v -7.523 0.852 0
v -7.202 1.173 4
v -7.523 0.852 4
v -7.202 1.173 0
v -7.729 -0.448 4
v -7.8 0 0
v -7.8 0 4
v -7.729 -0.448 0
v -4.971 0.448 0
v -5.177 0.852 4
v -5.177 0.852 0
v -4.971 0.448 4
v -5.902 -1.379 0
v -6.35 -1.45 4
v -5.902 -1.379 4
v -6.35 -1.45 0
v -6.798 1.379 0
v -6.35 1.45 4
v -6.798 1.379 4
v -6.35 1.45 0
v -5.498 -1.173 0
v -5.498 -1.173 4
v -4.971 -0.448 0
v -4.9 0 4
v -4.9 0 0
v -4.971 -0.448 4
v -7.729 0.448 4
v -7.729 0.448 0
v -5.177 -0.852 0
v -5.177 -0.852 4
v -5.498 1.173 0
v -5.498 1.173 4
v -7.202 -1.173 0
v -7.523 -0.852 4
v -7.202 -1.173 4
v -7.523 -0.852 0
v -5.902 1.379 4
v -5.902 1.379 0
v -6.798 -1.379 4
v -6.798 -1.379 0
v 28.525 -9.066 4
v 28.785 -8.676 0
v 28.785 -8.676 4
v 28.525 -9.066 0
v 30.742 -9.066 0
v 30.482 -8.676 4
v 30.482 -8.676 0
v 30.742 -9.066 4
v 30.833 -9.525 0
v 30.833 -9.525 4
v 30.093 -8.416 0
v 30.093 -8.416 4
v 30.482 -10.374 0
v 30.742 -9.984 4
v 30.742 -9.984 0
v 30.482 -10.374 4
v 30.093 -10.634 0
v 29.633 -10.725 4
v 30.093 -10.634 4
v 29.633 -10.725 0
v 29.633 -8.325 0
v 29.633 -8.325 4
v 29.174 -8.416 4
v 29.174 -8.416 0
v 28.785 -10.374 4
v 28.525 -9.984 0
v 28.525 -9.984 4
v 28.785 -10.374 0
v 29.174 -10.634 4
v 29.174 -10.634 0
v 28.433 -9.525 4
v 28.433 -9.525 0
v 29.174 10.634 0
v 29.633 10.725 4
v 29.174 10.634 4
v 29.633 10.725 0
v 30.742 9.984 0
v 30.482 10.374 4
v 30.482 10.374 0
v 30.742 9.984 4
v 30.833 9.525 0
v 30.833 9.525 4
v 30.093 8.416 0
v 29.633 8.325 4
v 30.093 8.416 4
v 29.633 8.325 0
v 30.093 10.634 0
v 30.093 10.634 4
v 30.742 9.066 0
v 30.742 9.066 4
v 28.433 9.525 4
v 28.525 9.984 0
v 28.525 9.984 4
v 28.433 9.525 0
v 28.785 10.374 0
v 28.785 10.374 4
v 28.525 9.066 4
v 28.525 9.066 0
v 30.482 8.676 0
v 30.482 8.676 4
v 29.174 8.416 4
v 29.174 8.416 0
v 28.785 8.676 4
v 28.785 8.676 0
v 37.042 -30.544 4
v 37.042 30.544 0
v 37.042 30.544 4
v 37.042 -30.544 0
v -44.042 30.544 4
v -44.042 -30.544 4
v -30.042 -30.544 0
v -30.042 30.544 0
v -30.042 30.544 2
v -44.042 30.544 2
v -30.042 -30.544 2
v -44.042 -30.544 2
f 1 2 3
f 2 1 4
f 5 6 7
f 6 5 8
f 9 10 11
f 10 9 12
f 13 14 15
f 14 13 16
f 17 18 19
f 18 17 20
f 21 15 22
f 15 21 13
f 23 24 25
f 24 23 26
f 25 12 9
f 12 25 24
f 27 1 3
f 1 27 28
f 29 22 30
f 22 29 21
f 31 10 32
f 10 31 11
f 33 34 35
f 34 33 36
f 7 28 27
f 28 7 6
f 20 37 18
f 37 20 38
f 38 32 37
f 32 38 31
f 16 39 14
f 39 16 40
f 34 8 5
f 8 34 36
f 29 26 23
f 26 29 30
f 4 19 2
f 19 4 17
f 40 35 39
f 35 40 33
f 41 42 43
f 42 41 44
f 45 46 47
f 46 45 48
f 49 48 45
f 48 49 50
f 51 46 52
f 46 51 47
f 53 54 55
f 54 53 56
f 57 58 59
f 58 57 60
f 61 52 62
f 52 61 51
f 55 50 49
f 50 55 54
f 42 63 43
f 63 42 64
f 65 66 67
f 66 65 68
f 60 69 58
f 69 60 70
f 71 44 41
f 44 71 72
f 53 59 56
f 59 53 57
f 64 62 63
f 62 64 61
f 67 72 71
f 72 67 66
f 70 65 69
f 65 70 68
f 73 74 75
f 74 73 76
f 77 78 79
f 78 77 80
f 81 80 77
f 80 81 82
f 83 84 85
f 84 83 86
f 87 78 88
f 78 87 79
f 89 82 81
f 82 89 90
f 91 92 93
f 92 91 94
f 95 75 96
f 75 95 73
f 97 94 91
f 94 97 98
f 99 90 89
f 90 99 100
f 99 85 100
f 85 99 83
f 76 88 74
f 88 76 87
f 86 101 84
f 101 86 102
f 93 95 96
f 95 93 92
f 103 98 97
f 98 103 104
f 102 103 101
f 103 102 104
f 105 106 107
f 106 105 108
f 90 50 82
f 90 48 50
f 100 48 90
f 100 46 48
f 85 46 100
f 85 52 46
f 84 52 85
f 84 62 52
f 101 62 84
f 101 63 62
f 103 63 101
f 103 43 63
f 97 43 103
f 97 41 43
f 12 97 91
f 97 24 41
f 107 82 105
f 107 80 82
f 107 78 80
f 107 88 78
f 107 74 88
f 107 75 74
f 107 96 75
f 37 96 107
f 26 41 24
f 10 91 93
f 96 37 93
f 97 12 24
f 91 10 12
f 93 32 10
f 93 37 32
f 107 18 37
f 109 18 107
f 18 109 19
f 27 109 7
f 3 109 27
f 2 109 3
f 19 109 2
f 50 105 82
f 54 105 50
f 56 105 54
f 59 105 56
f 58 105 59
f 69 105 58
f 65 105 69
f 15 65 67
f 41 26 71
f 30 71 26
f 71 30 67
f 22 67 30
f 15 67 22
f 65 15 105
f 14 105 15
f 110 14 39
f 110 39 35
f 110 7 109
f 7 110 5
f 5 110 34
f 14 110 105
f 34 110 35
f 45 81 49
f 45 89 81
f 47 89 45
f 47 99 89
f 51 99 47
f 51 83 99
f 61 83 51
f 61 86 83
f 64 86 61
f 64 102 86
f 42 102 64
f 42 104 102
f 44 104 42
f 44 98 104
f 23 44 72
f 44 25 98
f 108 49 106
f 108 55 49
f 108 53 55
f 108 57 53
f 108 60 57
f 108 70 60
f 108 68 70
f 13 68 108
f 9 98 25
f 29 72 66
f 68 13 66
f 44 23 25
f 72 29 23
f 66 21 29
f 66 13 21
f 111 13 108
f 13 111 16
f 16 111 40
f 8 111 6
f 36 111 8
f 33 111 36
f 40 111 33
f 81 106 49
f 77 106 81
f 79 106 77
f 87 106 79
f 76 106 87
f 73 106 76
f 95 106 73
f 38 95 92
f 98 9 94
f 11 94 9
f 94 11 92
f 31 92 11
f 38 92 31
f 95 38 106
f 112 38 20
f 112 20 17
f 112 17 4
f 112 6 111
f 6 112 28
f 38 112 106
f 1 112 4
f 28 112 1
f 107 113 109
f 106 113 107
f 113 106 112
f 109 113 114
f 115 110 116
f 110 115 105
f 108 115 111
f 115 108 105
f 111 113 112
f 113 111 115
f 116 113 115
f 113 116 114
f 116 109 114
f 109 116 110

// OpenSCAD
// file: ../../library/e7_all.scad
// ==========================================================================
//  e7_all.scad - include this one file. Preview, print plates and the report.
// ==========================================================================
include <e7_params.scad>
include <e7_body.scad>

// whole painted loco
module e7_preview() {
  // carbody in its paint bands
  for (i = [0:len(PAINT_BANDS) - 1]) {
    z0 = i == 0 ? -1 : p(PAINT_BANDS[i - 1][0]);
    z1 = i == len(PAINT_BANDS) - 1 ? 1000 : p(PAINT_BANDS[i][0]);
    color(PAINT_BANDS[i][1]) render(convexity = 8) e7_shell_solid([z0, z1]);
  }
  color(C_GLASS) e7_glass();
  color(C_LENS) let (d = nose_d_at_z(HEADLIGHT[0]))
    translate([XF - p(d) + p(HEADLIGHT[2]) + p(1.5), 0, p(HEADLIGHT[0])]) rotate([0, 90, 0]) cylinder(d = p(HEADLIGHT[1]) - 0.8, h = 0.5, $fn = 32);
  color(C_FRAME) { for (j = [1:NFRAME]) e7_frame_piece(j); e7_pilot(); e7_pilot_rear(); }
  for (tx = [TRK_X, -TRK_X]) translate([tx, 0, 0]) { color(C_TRUCK) e7_truck_frame(); color(C_WHEEL) e7_wheels(); }
}
// thin glass panes sitting in the window pockets (preview only)
module e7_glass() {
  intersection() { e7_loft(DET * 0.6); union() { e7_windshield_cut(); e7_side_cuts_windows_only(); } }
}
module e7_side_cuts_windows_only() {
  for (s = [-1, 1], w = CAB_WIN)
    translate([XF - p(w[1]), s * HW - (s > 0 ? DET : 3 - DET), p(w[2])]) cube([p(w[1] - w[0]), 3, p(w[3] - w[2])]);
}

// one print, laid out for the printer
module e7_plate(part) {
  sec = [for (k = [1:NSEC]) str("body_", k)];
  frm = [for (j = [1:NFRAME]) str("frame_", j)];
  if (is_num(search([part], sec)[0])) {
    k = search([part], sec)[0] + 1;
    // stand the section on its open bottom (skirt edge on the bed)
    translate([-sec_x0(k) - SEC_L / 2, 0, -Z_SKIRT]) e7_body_section(k);
  } else if (is_num(search([part], frm)[0])) {
    j = search([part], frm)[0] + 1;
    xs = concat([FRAME_X0], FRAME_SPLITS, [FRAME_X1]);
    translate([-(xs[j - 1] + xs[j]) / 2, 0, -Z_FRAME_BOT]) e7_frame_piece(j);
  } else if (part == "pilot") {
    translate([-XF, 0, 0]) rotate([0, 0, 0]) translate([0, 0, -p(5)]) e7_pilot();
  } else if (part == "pilot_rear") {
    translate([-XR, 0, 0]) translate([0, 0, -(CPL_Z - CPL_H / 2 - WALL)]) e7_pilot_rear();
  } else if (part == "truck") {
    // upside down, bolster on the bed
    translate([0, 0, Z_FRAME_BOT - 0.3]) rotate([180, 0, 0]) e7_truck_frame();
  } else {
    assert(false, str("unknown part '", part, "'"));
  }
}

module e7_report() {
  echo(str("MILW E7A ", ROAD_NO, " class ", CLASS, " - ", SC, " scale 1:", RATIO, ", paint ", PAINT));
  echo(str("  carbody ", round(BL), " mm long, ", round(2 * HW), " mm wide, roof ", round(Z_ROOF), " mm, cab ", round(Z_CAB), " mm above rail"));
  echo(str("  ", NSEC, " body sections of ", round(SEC_L), " mm; ", NFRAME, " frame pieces; trucks at +/- ", round(TRK_X), " mm"));
  echo(str("  body screws ", SCREW_BODY_NAME, " x ", 2 * len(BOSS_X), "; truck pivots ", PIVOT[1], "; wheels ", round(WHEEL_D * 10) / 10, " mm (bought)"));
}
// main file
// Milwaukee Road E7A, O scale 1-48 - print 5 of 8: frame_3 - frame plate piece 3 (front; print flat)
// Render (F6), export STL, print. Settings: ../../library/e7_params.scad
// Whole loco preview and notes: ../../MILW_E7_Main.scad
SCALE_SEL = "O";
include <../../library/e7_all.scad>
e7_plate("frame_3");
